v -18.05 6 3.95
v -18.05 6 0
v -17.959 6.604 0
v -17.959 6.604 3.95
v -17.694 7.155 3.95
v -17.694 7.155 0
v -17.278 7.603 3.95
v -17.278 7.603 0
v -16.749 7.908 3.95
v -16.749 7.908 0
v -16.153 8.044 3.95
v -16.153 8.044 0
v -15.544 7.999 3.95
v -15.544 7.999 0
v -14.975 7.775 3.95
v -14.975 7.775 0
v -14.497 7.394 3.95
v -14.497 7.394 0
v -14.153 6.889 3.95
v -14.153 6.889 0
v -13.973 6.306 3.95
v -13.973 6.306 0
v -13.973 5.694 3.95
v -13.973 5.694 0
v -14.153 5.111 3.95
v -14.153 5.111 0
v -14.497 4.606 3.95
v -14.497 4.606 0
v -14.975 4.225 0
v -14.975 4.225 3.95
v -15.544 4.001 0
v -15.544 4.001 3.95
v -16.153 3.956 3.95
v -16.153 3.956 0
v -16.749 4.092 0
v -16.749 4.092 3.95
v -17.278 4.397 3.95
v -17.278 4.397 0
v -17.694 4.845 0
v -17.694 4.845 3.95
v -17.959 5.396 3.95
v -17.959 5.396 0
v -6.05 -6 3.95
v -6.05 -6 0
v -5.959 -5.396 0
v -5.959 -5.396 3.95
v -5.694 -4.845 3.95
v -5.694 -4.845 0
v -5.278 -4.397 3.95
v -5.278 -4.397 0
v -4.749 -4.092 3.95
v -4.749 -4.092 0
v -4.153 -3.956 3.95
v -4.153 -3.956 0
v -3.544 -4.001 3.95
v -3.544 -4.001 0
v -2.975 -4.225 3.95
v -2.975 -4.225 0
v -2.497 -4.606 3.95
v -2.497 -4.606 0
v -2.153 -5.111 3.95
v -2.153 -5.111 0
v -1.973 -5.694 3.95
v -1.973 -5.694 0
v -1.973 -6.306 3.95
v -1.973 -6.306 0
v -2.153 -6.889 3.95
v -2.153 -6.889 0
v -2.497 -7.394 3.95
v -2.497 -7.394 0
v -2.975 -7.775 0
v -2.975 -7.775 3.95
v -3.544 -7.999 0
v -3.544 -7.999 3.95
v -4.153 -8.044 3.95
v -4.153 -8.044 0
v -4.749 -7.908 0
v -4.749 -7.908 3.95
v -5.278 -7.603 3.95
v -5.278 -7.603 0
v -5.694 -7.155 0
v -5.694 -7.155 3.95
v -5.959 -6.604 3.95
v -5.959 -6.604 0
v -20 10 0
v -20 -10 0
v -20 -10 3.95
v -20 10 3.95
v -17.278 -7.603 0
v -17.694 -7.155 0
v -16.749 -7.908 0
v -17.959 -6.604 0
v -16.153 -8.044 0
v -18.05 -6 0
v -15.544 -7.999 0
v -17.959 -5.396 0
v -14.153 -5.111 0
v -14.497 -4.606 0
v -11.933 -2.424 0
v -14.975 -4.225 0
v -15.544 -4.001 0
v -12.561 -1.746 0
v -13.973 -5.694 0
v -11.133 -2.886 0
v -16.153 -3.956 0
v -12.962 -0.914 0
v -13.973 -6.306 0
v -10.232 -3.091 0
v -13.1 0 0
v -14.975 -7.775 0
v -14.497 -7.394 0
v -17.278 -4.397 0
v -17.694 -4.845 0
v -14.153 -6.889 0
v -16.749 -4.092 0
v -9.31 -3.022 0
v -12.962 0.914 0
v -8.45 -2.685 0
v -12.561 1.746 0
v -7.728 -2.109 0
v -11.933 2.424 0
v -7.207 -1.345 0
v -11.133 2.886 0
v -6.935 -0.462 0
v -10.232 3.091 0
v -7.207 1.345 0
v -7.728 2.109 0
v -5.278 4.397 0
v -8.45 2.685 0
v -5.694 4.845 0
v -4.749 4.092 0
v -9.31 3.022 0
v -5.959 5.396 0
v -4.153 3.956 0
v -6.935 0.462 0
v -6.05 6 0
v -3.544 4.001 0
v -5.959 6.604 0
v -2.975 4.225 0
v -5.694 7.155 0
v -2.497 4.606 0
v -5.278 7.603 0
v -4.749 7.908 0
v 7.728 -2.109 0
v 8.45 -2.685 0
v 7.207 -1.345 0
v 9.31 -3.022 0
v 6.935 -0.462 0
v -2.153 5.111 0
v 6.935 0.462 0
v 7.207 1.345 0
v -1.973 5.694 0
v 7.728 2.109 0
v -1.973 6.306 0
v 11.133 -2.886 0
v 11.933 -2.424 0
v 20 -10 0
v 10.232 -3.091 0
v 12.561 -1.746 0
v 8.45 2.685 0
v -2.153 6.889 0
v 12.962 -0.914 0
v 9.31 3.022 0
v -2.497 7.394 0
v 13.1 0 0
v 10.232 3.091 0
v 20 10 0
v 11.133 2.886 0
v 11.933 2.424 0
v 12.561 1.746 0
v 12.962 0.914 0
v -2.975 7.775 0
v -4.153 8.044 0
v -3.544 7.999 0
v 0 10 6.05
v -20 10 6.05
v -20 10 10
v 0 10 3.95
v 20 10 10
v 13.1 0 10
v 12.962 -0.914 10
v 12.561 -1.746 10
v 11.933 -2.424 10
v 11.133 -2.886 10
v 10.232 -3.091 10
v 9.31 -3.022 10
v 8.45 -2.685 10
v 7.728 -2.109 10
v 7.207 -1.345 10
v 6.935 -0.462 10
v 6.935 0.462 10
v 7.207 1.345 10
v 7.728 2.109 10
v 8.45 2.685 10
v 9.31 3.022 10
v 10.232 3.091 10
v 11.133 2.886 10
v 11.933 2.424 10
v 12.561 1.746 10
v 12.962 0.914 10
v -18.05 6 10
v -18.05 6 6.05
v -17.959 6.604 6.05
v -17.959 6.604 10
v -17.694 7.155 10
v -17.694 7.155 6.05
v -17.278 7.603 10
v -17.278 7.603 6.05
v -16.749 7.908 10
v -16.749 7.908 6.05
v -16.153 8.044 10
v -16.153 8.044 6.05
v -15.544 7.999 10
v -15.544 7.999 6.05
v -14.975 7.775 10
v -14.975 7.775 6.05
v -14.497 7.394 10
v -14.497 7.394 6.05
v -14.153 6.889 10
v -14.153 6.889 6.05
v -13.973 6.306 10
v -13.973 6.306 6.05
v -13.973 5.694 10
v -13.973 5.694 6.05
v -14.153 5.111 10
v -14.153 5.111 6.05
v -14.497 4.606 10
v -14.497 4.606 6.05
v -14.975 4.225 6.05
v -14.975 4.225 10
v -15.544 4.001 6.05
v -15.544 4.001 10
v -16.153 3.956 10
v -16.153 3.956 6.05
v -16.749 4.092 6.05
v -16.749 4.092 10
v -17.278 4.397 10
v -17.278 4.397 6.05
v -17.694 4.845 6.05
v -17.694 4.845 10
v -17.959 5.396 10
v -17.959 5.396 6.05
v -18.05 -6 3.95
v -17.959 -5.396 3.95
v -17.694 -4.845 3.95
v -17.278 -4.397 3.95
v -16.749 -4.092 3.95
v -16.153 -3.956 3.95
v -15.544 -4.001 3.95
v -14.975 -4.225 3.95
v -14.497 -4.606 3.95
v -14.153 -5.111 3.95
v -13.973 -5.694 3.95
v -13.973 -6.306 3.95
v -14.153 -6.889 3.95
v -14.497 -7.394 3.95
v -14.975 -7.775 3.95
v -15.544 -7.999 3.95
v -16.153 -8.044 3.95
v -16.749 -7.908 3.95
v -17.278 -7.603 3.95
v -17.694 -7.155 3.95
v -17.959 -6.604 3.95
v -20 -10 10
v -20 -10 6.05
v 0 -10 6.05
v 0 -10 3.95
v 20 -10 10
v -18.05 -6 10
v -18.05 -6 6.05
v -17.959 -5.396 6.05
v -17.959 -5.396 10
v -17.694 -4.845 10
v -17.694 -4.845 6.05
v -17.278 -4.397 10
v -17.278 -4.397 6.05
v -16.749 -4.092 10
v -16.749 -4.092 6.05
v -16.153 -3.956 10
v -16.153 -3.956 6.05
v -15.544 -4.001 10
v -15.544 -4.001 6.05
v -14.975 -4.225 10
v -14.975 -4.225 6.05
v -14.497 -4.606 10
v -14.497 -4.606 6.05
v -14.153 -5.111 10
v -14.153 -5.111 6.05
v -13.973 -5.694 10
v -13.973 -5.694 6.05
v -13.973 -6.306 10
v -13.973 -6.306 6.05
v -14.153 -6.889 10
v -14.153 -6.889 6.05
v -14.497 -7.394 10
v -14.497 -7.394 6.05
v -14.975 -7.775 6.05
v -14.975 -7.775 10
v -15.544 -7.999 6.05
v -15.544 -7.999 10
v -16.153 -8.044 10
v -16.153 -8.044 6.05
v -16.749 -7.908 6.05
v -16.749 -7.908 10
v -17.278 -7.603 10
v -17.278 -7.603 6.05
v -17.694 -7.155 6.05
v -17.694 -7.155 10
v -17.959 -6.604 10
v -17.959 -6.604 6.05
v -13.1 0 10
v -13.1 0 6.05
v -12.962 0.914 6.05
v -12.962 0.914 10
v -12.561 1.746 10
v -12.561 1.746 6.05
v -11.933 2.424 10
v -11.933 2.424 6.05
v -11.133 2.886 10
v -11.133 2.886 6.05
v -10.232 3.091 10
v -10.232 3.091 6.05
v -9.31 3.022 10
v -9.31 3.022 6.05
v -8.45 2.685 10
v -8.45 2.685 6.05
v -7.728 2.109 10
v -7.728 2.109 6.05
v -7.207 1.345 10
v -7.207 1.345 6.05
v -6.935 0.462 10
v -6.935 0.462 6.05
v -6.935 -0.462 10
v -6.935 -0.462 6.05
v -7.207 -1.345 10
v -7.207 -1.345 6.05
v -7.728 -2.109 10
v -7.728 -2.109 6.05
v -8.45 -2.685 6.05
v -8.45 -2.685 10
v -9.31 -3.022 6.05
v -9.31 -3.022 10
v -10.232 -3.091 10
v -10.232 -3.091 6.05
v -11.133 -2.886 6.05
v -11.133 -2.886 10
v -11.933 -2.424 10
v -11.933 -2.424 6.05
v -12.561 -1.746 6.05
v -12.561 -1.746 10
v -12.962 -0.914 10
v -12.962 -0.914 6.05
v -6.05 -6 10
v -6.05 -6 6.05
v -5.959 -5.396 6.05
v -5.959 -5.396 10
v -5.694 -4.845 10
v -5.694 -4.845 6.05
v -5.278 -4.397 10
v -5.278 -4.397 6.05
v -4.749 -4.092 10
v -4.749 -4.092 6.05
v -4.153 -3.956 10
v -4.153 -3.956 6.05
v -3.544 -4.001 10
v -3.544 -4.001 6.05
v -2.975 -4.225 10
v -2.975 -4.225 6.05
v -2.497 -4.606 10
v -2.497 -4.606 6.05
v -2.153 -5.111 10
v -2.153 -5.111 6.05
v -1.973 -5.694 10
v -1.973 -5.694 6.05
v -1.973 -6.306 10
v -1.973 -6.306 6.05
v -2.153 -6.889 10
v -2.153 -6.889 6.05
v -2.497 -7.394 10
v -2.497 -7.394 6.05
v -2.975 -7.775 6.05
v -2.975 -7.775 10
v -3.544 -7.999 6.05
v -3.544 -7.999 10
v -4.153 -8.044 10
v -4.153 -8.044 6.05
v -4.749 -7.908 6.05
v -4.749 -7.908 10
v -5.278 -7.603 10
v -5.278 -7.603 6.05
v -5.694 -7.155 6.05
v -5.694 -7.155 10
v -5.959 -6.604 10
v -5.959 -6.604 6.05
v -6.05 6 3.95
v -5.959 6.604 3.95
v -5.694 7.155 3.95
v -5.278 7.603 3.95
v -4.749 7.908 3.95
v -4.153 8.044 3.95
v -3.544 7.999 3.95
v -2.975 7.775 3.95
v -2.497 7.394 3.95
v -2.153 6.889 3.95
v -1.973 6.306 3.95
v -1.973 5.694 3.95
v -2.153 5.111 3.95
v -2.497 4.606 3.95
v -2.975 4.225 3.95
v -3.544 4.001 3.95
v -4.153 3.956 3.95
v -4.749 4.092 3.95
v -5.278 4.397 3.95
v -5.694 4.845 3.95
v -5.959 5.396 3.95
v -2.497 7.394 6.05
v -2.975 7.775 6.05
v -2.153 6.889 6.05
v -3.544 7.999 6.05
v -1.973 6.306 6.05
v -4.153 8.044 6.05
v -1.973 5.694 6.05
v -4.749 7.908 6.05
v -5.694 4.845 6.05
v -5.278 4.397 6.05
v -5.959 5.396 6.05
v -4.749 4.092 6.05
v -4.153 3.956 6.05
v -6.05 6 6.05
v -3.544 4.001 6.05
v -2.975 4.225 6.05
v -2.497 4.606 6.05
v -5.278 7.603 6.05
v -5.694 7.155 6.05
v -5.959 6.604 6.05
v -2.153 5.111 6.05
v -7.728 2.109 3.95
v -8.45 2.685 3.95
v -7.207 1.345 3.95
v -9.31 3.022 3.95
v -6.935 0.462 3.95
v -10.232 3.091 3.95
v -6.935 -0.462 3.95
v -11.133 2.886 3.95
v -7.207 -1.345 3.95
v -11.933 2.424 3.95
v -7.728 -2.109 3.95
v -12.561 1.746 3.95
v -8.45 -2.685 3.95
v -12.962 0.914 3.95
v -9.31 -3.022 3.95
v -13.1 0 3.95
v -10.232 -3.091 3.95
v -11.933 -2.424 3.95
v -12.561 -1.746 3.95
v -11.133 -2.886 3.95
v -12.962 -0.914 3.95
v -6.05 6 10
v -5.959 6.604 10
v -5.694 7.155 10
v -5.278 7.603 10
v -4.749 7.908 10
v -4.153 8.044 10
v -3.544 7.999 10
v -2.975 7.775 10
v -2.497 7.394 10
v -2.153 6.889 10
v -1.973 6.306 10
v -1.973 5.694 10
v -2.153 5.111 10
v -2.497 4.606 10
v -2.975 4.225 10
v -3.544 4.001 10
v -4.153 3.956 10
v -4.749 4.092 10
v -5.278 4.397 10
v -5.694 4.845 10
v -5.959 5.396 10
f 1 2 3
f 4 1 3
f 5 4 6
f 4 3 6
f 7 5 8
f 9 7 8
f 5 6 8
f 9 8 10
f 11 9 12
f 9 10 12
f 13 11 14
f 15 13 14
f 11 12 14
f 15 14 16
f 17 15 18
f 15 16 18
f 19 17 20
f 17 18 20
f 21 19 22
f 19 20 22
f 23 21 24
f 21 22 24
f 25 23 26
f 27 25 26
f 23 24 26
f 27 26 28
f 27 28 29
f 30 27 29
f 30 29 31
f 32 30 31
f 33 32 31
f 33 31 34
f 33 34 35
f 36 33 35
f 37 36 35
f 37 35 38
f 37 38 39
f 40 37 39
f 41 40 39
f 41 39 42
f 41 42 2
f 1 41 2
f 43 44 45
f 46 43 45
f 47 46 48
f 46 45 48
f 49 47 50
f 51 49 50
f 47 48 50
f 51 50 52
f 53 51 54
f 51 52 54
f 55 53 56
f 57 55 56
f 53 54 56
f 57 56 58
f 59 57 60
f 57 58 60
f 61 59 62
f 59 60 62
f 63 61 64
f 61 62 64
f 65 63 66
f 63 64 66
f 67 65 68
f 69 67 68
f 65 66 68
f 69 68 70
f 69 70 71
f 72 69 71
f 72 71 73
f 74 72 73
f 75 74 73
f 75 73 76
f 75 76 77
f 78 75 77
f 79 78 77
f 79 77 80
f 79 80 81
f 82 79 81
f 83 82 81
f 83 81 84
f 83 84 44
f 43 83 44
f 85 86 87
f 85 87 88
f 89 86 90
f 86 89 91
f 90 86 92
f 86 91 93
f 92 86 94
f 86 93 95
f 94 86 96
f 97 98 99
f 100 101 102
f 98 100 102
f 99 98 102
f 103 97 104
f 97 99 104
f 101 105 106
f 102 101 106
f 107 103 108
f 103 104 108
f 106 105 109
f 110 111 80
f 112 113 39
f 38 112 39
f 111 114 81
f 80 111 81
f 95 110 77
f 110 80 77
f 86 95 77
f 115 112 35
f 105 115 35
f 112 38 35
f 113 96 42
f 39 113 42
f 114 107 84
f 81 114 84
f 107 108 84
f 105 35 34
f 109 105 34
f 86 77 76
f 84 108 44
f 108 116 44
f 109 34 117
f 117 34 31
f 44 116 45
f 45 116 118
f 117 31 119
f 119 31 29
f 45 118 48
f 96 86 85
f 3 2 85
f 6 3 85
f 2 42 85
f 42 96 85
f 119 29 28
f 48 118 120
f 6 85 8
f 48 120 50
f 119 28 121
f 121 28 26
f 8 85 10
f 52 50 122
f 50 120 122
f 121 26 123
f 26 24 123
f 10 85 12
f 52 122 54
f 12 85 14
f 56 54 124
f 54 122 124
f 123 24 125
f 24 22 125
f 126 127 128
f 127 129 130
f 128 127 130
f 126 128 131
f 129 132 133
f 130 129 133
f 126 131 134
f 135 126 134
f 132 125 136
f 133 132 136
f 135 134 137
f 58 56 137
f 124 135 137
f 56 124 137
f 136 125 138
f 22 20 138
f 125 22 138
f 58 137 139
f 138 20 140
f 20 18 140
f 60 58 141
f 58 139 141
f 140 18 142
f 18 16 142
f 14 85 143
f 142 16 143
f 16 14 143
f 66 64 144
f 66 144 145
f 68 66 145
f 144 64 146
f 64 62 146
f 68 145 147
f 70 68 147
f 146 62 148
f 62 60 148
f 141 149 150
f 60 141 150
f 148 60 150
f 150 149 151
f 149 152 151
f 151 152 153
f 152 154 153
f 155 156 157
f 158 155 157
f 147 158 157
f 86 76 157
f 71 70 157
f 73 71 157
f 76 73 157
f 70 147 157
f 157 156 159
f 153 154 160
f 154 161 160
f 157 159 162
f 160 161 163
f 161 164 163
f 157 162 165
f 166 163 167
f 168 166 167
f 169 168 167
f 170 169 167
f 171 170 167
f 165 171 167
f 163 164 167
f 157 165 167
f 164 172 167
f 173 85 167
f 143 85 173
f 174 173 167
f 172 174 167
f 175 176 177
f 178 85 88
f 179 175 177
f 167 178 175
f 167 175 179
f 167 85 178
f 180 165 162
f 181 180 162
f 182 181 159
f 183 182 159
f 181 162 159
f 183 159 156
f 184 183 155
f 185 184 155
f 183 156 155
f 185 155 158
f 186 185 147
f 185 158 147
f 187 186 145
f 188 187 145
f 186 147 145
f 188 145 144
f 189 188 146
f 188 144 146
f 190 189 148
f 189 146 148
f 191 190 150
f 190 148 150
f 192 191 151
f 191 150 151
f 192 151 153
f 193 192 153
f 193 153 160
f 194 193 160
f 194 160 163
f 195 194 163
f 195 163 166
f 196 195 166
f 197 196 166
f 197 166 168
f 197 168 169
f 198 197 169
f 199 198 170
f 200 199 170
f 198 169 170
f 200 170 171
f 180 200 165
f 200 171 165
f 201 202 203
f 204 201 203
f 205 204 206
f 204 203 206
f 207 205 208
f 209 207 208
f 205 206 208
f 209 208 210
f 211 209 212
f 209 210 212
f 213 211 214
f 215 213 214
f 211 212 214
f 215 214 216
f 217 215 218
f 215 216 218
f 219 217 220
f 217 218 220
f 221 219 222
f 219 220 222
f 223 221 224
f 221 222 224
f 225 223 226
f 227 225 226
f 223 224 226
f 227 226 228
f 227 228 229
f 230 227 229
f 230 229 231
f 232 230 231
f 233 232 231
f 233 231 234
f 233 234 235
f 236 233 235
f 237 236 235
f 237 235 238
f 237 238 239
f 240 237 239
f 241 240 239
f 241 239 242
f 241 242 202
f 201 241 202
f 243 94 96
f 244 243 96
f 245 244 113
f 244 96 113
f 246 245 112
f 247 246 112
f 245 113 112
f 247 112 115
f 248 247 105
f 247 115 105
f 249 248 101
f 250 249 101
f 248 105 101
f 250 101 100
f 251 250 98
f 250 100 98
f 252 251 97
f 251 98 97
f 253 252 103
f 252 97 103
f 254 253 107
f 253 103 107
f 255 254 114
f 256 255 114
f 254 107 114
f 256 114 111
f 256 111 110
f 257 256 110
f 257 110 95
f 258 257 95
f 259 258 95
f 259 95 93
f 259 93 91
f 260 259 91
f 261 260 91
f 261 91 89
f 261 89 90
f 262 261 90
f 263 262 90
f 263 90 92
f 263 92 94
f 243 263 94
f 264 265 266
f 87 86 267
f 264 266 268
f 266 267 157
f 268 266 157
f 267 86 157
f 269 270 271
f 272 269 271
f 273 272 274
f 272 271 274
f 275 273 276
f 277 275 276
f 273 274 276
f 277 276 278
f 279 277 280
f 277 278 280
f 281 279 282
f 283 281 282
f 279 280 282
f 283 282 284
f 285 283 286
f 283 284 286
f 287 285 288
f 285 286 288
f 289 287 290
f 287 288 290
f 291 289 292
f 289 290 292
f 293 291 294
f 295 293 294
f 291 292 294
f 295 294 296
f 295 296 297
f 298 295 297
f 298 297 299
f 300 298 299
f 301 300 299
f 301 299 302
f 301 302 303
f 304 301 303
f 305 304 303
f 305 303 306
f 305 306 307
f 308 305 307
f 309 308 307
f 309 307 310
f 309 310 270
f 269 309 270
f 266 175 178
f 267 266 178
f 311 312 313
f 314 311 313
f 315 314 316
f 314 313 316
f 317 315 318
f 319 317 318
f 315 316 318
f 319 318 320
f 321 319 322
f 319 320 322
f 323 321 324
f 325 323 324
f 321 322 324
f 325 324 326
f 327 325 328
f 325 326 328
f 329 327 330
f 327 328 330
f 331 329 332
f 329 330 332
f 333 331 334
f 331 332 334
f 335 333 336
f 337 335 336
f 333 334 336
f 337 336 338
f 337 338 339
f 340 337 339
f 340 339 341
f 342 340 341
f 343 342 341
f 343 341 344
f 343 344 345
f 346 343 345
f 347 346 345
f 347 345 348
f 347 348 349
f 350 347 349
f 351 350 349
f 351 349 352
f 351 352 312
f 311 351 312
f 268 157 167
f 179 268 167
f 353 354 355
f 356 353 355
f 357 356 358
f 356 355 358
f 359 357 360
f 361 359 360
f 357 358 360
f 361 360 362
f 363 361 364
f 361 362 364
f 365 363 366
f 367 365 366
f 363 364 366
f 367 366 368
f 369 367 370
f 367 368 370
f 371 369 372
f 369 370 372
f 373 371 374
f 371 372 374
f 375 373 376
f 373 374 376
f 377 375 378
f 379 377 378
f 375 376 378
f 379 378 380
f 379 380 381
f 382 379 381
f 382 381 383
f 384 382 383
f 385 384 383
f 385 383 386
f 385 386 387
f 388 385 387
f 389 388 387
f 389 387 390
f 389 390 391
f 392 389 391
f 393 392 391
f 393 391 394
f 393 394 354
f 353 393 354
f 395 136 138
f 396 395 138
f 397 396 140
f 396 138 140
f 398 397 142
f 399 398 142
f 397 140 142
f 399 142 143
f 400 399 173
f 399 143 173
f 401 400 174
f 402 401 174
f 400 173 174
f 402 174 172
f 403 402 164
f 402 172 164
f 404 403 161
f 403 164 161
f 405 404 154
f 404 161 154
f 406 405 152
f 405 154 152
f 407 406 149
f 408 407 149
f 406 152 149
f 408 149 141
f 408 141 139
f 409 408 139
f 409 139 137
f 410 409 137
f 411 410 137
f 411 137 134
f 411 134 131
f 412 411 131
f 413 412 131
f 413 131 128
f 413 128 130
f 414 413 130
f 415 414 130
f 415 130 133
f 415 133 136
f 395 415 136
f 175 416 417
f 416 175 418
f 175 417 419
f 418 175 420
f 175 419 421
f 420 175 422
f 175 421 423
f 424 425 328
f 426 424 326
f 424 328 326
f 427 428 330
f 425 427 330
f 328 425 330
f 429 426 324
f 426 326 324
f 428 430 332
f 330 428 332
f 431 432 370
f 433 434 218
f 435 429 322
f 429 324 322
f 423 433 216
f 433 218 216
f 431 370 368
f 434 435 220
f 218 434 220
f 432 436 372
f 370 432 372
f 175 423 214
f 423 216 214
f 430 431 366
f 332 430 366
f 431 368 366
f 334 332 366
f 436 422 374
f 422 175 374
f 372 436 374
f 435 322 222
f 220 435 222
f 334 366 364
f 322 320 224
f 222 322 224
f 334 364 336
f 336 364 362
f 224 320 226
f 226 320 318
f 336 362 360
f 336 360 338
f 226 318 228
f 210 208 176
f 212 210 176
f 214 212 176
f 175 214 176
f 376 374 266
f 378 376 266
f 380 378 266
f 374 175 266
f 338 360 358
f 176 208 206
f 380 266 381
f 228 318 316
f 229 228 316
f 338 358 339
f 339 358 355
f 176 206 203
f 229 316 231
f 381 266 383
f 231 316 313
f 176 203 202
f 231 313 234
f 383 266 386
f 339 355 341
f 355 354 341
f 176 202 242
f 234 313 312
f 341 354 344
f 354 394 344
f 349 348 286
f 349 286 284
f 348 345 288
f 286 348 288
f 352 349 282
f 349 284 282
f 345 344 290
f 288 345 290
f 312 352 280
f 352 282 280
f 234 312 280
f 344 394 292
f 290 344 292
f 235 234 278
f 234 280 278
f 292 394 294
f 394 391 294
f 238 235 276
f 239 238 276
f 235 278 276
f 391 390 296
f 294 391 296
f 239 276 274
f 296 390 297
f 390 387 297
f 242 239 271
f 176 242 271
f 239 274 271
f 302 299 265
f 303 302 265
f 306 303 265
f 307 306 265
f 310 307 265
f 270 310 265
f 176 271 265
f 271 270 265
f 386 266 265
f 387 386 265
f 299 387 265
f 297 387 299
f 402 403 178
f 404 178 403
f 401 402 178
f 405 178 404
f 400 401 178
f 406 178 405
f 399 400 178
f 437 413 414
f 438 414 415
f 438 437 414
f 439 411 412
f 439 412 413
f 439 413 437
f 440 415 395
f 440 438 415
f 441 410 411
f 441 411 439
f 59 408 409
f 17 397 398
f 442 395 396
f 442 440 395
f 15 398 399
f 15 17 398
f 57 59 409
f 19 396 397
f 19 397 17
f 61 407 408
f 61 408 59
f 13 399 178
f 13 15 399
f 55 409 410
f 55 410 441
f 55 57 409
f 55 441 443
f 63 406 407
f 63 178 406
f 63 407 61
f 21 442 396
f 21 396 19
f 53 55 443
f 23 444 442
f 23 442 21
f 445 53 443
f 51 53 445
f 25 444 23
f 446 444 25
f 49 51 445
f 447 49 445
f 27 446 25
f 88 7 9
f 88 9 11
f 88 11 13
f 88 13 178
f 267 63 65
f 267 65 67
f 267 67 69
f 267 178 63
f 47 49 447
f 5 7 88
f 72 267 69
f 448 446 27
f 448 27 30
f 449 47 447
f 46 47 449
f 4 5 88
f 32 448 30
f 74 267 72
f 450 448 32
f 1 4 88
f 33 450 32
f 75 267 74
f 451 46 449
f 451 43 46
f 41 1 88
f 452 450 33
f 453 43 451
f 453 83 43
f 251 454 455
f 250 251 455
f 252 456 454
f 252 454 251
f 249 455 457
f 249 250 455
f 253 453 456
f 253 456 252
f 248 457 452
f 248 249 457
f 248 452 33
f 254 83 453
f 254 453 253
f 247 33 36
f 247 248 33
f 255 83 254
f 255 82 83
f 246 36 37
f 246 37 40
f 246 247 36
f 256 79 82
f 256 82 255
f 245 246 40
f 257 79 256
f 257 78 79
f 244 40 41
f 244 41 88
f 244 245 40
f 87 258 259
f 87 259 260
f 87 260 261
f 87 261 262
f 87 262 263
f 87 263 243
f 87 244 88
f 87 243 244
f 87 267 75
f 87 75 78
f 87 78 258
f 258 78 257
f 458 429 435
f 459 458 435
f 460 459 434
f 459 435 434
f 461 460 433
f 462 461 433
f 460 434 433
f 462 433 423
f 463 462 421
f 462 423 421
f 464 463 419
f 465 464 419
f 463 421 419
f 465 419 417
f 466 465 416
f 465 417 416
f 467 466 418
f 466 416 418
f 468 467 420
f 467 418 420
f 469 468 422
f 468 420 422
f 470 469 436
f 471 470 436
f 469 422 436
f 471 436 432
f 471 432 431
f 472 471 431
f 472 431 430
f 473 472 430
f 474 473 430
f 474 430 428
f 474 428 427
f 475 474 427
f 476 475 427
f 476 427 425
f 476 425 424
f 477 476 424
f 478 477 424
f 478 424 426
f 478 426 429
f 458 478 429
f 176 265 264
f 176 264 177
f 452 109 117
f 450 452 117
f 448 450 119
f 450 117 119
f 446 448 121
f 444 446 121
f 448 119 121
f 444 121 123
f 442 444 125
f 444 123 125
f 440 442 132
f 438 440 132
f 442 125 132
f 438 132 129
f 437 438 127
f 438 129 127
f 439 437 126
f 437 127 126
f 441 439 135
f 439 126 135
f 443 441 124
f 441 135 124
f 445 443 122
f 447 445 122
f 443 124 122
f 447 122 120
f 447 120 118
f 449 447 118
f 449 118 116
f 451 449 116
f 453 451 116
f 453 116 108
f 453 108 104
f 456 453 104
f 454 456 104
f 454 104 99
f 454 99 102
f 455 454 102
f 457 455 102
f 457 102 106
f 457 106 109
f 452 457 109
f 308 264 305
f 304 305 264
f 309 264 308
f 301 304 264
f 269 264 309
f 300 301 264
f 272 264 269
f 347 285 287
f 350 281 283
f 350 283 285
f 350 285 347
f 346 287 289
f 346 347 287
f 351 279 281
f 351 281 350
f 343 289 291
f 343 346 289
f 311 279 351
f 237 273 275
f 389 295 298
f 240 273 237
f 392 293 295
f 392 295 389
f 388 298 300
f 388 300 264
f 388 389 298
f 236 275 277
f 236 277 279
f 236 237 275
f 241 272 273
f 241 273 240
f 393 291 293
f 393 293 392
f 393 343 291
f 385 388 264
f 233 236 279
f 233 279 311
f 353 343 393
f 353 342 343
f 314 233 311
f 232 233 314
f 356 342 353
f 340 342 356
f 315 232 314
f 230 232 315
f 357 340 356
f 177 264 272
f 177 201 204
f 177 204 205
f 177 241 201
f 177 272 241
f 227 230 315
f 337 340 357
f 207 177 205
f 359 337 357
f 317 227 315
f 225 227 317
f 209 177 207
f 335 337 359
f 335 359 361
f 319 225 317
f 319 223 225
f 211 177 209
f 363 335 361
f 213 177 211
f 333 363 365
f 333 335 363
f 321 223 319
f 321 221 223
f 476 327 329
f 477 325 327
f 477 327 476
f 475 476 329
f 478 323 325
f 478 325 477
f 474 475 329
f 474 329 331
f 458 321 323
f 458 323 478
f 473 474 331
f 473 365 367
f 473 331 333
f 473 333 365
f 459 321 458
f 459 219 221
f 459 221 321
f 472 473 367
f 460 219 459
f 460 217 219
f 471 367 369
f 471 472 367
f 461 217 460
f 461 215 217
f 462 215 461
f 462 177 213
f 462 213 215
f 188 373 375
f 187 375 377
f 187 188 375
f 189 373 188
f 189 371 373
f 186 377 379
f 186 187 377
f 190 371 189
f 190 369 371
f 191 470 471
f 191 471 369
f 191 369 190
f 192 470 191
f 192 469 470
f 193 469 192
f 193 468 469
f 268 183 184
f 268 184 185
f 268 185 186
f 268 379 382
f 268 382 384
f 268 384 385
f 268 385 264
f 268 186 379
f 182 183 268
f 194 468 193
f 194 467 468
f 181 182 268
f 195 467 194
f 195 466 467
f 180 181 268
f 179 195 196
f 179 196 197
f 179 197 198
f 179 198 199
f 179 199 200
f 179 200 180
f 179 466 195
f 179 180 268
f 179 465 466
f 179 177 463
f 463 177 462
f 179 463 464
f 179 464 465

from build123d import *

# Parameters (mm, degrees)
ESQUISSE1_W             = 40
ESQUISSE1_H             = 20
BOSS_EXTRU_1_DEPTH      = 10
ESQUISSE3_W             = 40
ESQUISSE3_H             = 2.1
ENL_V_MAT_EXTRU_2_DEPTH = 31
ESQUISSE4_R             = 2.05
ENL_V_MAT_EXTRU_3_DEPTH = 25.494897428
ESQUISSE5_R             = 3.1
ENL_V_MAT_EXTRU_4_DEPTH = 10


with BuildPart() as part:
    # Esquisse1 → Boss.-Extru.1 (new body)
    with BuildSketch(Plane.XY):
        Rectangle(ESQUISSE1_W, ESQUISSE1_H)
    extrude(amount=BOSS_EXTRU_1_DEPTH)

    # Esquisse3 → Enlèv. mat.-Extru.2 (cut, through all)
    with BuildSketch(Plane(origin=(0, -10, 0), x_dir=(-1, 0, 0), z_dir=(0, -1, 0))):
        with Locations((20, -5)):
            Rectangle(ESQUISSE3_W, ESQUISSE3_H)
    extrude(amount=-ENL_V_MAT_EXTRU_2_DEPTH, mode=Mode.SUBTRACT)

    # Esquisse4 → Enlèv. mat.-Extru.3 (cut, through all)
    with BuildSketch(Plane(origin=(0, 0, 0), x_dir=(-1, 0, 0), z_dir=(0, 0, -1))):
        with Locations((16, 6)):
            Circle(ESQUISSE4_R)
        with Locations((4, 6)):
            Circle(ESQUISSE4_R)
        with Locations((4, -6)):
            Circle(ESQUISSE4_R)
        with Locations((16, -6)):
            Circle(ESQUISSE4_R)
    extrude(amount=-ENL_V_MAT_EXTRU_3_DEPTH, mode=Mode.SUBTRACT)

    # Esquisse5 → Enlèv. mat.-Extru.4 (cut)
    with BuildSketch(Plane(origin=(0, 0, 0), x_dir=(-1, 0, 0), z_dir=(0, 0, -1))):
        with Locations((10, 0)):
            Circle(ESQUISSE5_R)
        with Locations(Location((-10, 0, 0), (0, 0, 180))):
            Circle(ESQUISSE5_R)
    extrude(amount=-ENL_V_MAT_EXTRU_4_DEPTH, mode=Mode.SUBTRACT)


solid = part.part
